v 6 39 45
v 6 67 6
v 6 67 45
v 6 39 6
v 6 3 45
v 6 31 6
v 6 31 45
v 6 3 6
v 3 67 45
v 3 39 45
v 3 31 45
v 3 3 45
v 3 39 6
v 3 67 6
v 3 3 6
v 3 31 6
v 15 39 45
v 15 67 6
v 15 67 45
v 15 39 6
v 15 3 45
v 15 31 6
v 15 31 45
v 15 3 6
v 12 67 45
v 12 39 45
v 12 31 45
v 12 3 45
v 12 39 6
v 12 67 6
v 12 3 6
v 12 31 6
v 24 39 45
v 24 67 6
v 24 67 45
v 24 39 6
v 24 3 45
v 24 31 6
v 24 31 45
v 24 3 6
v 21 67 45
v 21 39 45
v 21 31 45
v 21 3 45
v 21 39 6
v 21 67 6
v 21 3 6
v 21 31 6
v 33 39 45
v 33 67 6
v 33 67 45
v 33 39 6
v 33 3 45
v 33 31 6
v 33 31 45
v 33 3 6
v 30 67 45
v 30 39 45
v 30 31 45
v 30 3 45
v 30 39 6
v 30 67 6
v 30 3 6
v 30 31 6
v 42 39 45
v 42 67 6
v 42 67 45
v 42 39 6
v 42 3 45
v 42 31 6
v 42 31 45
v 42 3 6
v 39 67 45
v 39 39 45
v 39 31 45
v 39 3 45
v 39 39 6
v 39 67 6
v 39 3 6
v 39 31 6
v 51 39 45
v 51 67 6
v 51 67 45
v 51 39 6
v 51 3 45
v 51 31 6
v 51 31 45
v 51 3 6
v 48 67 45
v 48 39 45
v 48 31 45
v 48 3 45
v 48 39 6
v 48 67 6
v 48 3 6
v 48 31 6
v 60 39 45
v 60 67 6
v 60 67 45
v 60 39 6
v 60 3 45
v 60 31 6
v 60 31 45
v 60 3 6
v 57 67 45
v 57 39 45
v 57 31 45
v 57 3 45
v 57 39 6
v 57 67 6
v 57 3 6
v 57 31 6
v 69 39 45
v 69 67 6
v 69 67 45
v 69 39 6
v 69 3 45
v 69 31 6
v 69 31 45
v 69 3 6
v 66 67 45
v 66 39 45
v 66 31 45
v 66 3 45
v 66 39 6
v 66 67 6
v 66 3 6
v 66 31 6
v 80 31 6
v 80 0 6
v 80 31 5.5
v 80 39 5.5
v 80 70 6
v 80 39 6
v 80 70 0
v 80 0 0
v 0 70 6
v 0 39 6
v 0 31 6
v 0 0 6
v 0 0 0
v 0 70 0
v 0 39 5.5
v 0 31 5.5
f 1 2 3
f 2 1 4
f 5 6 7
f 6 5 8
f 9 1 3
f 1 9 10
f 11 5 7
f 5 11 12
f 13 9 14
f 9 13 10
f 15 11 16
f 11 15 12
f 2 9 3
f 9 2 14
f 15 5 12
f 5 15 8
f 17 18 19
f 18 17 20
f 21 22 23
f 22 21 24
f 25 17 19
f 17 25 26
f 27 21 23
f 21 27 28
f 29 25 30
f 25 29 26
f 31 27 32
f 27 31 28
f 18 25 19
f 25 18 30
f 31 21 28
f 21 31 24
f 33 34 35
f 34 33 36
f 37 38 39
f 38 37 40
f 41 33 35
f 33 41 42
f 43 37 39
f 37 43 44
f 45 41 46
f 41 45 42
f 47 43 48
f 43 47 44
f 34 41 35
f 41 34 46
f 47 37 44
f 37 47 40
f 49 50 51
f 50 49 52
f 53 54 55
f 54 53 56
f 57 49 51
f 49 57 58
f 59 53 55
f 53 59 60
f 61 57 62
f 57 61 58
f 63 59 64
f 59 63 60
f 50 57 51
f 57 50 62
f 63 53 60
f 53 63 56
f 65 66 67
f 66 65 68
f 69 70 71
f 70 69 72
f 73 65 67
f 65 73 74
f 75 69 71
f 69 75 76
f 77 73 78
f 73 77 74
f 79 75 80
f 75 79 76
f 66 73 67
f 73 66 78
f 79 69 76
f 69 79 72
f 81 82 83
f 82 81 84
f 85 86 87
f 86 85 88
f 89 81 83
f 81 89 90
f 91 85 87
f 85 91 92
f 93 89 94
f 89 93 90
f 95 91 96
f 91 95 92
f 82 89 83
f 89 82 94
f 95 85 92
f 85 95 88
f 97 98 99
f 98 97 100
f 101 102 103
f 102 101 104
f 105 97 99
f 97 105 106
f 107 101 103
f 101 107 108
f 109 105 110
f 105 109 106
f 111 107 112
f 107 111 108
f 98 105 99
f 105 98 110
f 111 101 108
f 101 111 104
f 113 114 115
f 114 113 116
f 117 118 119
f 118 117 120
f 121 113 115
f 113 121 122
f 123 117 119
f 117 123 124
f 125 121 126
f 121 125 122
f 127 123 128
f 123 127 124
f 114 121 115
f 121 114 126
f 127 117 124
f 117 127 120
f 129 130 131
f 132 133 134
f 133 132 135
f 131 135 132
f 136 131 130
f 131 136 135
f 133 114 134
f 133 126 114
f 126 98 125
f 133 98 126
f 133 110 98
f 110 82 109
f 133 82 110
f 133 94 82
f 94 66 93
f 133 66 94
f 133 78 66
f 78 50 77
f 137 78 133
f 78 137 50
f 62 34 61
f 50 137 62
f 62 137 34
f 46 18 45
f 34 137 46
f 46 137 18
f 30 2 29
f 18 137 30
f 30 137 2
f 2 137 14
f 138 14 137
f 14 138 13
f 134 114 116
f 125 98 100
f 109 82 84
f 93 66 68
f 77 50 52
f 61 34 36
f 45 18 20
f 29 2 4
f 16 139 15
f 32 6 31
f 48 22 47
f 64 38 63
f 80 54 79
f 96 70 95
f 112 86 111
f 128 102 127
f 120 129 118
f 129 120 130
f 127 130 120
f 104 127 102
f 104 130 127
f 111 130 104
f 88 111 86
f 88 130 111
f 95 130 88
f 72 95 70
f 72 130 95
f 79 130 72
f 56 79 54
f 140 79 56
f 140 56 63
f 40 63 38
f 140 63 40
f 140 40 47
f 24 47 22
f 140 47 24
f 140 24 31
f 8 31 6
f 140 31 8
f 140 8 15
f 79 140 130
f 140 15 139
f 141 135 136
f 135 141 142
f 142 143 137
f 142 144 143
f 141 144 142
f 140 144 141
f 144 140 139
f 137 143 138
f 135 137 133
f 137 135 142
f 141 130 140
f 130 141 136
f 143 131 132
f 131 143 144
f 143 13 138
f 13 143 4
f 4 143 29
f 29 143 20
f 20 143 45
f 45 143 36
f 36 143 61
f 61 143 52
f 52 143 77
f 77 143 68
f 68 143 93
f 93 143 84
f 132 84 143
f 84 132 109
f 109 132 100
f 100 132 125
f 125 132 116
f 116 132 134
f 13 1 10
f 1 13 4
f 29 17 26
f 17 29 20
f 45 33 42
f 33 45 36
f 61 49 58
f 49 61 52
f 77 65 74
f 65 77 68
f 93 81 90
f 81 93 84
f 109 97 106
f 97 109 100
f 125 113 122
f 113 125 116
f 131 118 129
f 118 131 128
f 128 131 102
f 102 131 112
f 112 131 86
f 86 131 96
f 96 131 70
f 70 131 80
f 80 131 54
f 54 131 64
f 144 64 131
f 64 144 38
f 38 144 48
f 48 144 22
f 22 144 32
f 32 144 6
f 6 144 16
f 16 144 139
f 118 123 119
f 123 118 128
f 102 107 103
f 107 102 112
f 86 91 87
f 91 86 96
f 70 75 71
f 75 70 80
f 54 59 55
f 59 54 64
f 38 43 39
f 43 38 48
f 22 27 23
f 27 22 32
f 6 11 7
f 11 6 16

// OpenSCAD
$fn = 32;

// ----------------------------------------------------------------------
// Heatsink: slotted fin block
// ----------------------------------------------------------------------

// --- parameters (mm) ---
base_l = 80;              // base length, X
base_w = 70;              // base width, Y
base_t = 6;               // base plate thickness
fin_h = 40;               // fin height above the base
fin_t = 3;                // fin thickness
edge = 3;                 // margin from the base ends
pitch = 9;                // fin pitch
slot_w = 8;               // central slot width, Y

n_fins = floor((base_l - 2 * edge - fin_t) / pitch) + 1;  // fin count
total_h = base_t + fin_h - 1;  // overall height

difference() {
union() {
  cube([base_l, base_w, base_t]);
  for (i = [0 : n_fins - 1])
    translate([edge + i * pitch, edge, base_t - 1])
      cube([fin_t, base_w - 2 * edge, fin_h]);
}
  translate([-1, base_w / 2 - slot_w / 2, base_t - 0.5])
    cube([base_l + 2, slot_w, fin_h + 2]);
}
